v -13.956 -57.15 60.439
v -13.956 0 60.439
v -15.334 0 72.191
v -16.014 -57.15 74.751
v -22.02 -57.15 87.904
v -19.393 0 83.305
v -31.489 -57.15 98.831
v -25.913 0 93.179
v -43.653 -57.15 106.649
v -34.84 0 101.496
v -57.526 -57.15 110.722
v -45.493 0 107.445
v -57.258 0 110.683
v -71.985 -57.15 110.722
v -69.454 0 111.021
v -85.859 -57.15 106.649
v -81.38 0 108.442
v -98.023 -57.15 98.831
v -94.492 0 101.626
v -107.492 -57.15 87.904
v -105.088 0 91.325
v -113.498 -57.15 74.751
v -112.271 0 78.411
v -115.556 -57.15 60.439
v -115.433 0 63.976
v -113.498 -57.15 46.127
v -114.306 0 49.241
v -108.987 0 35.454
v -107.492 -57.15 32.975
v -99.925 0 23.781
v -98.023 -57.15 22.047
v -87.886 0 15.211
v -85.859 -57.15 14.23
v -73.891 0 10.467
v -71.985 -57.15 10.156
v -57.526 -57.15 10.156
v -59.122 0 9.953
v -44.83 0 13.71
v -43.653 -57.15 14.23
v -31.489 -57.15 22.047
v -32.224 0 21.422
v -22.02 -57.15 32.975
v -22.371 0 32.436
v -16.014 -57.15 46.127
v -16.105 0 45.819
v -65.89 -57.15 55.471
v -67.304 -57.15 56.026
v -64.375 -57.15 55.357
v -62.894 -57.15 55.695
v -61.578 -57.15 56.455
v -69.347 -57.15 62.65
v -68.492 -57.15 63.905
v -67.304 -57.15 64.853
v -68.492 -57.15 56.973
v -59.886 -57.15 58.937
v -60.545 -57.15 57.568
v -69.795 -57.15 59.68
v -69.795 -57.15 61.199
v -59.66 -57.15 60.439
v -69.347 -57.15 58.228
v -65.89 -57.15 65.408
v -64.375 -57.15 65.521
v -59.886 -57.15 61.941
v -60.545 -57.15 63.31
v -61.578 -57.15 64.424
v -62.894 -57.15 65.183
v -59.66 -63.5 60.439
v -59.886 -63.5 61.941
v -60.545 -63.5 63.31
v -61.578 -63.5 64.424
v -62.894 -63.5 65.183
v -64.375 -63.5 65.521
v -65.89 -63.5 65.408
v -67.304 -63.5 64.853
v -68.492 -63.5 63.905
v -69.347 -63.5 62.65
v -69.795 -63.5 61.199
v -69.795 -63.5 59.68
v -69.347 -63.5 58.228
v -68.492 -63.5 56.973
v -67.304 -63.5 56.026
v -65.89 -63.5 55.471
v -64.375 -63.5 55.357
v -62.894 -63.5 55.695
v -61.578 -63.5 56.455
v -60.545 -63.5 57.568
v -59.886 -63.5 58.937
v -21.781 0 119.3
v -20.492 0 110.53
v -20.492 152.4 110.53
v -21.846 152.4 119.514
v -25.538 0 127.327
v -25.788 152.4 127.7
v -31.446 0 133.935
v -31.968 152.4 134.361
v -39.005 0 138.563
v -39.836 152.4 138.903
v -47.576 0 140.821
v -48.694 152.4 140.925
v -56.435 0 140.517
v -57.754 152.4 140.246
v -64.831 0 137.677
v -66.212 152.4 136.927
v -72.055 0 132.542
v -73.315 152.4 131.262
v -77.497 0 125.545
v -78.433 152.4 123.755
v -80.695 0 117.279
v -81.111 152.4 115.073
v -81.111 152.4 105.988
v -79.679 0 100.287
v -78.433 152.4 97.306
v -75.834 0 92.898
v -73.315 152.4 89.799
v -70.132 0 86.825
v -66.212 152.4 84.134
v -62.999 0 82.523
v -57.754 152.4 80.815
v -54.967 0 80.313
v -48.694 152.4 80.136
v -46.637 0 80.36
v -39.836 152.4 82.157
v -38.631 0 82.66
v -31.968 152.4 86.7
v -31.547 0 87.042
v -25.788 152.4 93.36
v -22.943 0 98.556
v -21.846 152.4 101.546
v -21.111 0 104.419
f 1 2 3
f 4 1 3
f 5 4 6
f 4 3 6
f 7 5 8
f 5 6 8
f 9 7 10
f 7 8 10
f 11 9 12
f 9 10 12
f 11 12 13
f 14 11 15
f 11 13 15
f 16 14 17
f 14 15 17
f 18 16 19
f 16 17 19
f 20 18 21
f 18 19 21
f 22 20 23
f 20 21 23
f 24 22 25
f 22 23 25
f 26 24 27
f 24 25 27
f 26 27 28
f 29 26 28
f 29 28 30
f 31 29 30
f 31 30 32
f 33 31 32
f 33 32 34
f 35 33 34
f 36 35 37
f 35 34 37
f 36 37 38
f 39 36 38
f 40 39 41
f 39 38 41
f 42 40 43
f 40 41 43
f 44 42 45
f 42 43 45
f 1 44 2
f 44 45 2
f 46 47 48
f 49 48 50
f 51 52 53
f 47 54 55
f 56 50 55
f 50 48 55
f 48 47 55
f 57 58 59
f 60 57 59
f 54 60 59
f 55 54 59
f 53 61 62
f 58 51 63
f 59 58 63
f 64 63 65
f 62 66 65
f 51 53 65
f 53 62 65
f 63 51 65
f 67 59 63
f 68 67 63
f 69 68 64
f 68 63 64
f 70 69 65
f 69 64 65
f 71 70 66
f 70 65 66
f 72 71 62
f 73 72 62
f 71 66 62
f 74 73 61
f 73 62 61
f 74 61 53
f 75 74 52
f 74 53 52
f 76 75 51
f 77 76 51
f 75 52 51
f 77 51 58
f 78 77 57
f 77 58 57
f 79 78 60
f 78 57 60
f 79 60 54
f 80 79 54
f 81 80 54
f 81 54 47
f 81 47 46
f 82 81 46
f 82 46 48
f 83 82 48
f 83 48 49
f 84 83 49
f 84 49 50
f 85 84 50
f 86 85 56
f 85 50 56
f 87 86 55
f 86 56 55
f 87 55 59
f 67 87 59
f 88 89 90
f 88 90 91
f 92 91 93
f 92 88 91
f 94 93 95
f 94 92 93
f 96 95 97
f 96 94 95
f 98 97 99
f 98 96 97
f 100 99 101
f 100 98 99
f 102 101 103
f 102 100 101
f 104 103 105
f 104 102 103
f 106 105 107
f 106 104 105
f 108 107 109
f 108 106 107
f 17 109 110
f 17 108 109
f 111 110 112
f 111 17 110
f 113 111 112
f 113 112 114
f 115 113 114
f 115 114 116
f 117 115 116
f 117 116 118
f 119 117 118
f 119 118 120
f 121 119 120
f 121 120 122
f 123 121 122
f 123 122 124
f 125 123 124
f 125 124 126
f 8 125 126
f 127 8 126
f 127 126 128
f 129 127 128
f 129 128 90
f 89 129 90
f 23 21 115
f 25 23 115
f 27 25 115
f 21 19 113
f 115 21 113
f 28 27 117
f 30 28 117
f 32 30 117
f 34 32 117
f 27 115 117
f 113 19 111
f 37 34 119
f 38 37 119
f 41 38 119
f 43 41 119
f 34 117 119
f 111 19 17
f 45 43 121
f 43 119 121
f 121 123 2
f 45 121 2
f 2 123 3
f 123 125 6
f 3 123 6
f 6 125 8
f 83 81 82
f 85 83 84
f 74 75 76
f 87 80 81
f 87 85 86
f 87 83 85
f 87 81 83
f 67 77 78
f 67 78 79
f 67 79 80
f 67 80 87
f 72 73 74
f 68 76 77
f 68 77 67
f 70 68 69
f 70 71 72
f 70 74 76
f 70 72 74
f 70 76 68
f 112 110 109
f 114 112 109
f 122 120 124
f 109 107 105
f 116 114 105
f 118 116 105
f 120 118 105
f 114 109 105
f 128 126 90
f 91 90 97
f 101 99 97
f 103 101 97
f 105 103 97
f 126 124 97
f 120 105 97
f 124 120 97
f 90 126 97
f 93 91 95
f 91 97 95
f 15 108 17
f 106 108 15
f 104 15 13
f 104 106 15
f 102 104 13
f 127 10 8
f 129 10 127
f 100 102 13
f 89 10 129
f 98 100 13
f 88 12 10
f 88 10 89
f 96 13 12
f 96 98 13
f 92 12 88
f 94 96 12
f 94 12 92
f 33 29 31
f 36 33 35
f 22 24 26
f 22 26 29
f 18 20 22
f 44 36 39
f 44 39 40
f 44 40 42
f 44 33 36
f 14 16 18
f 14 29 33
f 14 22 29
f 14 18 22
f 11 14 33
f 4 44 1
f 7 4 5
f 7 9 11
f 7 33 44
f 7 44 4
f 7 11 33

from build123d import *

# Parameters (mm, degrees)
F0_R     = 50.8
F1_DEPTH = 57.15
F2_R     = 30.48
F3_DEPTH = 152.4
F4_R     = 5.096165
F5_DEPTH = 6.35


with BuildPart() as f1:
    # F0 (on Front) → F1 (new body)
    with BuildSketch(Plane.XZ):
        with Locations((-64.75585, 60.43921)):
            Circle(F0_R)
    extrude(amount=F1_DEPTH)

    # F2 (on Front) → F3 (join)
    with BuildSketch(Plane.XZ):
        with Locations((-50.971899, 110.530347)):
            Circle(F2_R)
    extrude(amount=-F3_DEPTH)


with BuildPart() as f5:
    # F4 (on face) → F5 (new body)
    with BuildSketch(Plane.XZ.offset(57.15)):
        with Locations((-64.75585, 60.43921)):
            Circle(F4_R)
    extrude(amount=F5_DEPTH)


solid = Compound([f1.part, f5.part])
